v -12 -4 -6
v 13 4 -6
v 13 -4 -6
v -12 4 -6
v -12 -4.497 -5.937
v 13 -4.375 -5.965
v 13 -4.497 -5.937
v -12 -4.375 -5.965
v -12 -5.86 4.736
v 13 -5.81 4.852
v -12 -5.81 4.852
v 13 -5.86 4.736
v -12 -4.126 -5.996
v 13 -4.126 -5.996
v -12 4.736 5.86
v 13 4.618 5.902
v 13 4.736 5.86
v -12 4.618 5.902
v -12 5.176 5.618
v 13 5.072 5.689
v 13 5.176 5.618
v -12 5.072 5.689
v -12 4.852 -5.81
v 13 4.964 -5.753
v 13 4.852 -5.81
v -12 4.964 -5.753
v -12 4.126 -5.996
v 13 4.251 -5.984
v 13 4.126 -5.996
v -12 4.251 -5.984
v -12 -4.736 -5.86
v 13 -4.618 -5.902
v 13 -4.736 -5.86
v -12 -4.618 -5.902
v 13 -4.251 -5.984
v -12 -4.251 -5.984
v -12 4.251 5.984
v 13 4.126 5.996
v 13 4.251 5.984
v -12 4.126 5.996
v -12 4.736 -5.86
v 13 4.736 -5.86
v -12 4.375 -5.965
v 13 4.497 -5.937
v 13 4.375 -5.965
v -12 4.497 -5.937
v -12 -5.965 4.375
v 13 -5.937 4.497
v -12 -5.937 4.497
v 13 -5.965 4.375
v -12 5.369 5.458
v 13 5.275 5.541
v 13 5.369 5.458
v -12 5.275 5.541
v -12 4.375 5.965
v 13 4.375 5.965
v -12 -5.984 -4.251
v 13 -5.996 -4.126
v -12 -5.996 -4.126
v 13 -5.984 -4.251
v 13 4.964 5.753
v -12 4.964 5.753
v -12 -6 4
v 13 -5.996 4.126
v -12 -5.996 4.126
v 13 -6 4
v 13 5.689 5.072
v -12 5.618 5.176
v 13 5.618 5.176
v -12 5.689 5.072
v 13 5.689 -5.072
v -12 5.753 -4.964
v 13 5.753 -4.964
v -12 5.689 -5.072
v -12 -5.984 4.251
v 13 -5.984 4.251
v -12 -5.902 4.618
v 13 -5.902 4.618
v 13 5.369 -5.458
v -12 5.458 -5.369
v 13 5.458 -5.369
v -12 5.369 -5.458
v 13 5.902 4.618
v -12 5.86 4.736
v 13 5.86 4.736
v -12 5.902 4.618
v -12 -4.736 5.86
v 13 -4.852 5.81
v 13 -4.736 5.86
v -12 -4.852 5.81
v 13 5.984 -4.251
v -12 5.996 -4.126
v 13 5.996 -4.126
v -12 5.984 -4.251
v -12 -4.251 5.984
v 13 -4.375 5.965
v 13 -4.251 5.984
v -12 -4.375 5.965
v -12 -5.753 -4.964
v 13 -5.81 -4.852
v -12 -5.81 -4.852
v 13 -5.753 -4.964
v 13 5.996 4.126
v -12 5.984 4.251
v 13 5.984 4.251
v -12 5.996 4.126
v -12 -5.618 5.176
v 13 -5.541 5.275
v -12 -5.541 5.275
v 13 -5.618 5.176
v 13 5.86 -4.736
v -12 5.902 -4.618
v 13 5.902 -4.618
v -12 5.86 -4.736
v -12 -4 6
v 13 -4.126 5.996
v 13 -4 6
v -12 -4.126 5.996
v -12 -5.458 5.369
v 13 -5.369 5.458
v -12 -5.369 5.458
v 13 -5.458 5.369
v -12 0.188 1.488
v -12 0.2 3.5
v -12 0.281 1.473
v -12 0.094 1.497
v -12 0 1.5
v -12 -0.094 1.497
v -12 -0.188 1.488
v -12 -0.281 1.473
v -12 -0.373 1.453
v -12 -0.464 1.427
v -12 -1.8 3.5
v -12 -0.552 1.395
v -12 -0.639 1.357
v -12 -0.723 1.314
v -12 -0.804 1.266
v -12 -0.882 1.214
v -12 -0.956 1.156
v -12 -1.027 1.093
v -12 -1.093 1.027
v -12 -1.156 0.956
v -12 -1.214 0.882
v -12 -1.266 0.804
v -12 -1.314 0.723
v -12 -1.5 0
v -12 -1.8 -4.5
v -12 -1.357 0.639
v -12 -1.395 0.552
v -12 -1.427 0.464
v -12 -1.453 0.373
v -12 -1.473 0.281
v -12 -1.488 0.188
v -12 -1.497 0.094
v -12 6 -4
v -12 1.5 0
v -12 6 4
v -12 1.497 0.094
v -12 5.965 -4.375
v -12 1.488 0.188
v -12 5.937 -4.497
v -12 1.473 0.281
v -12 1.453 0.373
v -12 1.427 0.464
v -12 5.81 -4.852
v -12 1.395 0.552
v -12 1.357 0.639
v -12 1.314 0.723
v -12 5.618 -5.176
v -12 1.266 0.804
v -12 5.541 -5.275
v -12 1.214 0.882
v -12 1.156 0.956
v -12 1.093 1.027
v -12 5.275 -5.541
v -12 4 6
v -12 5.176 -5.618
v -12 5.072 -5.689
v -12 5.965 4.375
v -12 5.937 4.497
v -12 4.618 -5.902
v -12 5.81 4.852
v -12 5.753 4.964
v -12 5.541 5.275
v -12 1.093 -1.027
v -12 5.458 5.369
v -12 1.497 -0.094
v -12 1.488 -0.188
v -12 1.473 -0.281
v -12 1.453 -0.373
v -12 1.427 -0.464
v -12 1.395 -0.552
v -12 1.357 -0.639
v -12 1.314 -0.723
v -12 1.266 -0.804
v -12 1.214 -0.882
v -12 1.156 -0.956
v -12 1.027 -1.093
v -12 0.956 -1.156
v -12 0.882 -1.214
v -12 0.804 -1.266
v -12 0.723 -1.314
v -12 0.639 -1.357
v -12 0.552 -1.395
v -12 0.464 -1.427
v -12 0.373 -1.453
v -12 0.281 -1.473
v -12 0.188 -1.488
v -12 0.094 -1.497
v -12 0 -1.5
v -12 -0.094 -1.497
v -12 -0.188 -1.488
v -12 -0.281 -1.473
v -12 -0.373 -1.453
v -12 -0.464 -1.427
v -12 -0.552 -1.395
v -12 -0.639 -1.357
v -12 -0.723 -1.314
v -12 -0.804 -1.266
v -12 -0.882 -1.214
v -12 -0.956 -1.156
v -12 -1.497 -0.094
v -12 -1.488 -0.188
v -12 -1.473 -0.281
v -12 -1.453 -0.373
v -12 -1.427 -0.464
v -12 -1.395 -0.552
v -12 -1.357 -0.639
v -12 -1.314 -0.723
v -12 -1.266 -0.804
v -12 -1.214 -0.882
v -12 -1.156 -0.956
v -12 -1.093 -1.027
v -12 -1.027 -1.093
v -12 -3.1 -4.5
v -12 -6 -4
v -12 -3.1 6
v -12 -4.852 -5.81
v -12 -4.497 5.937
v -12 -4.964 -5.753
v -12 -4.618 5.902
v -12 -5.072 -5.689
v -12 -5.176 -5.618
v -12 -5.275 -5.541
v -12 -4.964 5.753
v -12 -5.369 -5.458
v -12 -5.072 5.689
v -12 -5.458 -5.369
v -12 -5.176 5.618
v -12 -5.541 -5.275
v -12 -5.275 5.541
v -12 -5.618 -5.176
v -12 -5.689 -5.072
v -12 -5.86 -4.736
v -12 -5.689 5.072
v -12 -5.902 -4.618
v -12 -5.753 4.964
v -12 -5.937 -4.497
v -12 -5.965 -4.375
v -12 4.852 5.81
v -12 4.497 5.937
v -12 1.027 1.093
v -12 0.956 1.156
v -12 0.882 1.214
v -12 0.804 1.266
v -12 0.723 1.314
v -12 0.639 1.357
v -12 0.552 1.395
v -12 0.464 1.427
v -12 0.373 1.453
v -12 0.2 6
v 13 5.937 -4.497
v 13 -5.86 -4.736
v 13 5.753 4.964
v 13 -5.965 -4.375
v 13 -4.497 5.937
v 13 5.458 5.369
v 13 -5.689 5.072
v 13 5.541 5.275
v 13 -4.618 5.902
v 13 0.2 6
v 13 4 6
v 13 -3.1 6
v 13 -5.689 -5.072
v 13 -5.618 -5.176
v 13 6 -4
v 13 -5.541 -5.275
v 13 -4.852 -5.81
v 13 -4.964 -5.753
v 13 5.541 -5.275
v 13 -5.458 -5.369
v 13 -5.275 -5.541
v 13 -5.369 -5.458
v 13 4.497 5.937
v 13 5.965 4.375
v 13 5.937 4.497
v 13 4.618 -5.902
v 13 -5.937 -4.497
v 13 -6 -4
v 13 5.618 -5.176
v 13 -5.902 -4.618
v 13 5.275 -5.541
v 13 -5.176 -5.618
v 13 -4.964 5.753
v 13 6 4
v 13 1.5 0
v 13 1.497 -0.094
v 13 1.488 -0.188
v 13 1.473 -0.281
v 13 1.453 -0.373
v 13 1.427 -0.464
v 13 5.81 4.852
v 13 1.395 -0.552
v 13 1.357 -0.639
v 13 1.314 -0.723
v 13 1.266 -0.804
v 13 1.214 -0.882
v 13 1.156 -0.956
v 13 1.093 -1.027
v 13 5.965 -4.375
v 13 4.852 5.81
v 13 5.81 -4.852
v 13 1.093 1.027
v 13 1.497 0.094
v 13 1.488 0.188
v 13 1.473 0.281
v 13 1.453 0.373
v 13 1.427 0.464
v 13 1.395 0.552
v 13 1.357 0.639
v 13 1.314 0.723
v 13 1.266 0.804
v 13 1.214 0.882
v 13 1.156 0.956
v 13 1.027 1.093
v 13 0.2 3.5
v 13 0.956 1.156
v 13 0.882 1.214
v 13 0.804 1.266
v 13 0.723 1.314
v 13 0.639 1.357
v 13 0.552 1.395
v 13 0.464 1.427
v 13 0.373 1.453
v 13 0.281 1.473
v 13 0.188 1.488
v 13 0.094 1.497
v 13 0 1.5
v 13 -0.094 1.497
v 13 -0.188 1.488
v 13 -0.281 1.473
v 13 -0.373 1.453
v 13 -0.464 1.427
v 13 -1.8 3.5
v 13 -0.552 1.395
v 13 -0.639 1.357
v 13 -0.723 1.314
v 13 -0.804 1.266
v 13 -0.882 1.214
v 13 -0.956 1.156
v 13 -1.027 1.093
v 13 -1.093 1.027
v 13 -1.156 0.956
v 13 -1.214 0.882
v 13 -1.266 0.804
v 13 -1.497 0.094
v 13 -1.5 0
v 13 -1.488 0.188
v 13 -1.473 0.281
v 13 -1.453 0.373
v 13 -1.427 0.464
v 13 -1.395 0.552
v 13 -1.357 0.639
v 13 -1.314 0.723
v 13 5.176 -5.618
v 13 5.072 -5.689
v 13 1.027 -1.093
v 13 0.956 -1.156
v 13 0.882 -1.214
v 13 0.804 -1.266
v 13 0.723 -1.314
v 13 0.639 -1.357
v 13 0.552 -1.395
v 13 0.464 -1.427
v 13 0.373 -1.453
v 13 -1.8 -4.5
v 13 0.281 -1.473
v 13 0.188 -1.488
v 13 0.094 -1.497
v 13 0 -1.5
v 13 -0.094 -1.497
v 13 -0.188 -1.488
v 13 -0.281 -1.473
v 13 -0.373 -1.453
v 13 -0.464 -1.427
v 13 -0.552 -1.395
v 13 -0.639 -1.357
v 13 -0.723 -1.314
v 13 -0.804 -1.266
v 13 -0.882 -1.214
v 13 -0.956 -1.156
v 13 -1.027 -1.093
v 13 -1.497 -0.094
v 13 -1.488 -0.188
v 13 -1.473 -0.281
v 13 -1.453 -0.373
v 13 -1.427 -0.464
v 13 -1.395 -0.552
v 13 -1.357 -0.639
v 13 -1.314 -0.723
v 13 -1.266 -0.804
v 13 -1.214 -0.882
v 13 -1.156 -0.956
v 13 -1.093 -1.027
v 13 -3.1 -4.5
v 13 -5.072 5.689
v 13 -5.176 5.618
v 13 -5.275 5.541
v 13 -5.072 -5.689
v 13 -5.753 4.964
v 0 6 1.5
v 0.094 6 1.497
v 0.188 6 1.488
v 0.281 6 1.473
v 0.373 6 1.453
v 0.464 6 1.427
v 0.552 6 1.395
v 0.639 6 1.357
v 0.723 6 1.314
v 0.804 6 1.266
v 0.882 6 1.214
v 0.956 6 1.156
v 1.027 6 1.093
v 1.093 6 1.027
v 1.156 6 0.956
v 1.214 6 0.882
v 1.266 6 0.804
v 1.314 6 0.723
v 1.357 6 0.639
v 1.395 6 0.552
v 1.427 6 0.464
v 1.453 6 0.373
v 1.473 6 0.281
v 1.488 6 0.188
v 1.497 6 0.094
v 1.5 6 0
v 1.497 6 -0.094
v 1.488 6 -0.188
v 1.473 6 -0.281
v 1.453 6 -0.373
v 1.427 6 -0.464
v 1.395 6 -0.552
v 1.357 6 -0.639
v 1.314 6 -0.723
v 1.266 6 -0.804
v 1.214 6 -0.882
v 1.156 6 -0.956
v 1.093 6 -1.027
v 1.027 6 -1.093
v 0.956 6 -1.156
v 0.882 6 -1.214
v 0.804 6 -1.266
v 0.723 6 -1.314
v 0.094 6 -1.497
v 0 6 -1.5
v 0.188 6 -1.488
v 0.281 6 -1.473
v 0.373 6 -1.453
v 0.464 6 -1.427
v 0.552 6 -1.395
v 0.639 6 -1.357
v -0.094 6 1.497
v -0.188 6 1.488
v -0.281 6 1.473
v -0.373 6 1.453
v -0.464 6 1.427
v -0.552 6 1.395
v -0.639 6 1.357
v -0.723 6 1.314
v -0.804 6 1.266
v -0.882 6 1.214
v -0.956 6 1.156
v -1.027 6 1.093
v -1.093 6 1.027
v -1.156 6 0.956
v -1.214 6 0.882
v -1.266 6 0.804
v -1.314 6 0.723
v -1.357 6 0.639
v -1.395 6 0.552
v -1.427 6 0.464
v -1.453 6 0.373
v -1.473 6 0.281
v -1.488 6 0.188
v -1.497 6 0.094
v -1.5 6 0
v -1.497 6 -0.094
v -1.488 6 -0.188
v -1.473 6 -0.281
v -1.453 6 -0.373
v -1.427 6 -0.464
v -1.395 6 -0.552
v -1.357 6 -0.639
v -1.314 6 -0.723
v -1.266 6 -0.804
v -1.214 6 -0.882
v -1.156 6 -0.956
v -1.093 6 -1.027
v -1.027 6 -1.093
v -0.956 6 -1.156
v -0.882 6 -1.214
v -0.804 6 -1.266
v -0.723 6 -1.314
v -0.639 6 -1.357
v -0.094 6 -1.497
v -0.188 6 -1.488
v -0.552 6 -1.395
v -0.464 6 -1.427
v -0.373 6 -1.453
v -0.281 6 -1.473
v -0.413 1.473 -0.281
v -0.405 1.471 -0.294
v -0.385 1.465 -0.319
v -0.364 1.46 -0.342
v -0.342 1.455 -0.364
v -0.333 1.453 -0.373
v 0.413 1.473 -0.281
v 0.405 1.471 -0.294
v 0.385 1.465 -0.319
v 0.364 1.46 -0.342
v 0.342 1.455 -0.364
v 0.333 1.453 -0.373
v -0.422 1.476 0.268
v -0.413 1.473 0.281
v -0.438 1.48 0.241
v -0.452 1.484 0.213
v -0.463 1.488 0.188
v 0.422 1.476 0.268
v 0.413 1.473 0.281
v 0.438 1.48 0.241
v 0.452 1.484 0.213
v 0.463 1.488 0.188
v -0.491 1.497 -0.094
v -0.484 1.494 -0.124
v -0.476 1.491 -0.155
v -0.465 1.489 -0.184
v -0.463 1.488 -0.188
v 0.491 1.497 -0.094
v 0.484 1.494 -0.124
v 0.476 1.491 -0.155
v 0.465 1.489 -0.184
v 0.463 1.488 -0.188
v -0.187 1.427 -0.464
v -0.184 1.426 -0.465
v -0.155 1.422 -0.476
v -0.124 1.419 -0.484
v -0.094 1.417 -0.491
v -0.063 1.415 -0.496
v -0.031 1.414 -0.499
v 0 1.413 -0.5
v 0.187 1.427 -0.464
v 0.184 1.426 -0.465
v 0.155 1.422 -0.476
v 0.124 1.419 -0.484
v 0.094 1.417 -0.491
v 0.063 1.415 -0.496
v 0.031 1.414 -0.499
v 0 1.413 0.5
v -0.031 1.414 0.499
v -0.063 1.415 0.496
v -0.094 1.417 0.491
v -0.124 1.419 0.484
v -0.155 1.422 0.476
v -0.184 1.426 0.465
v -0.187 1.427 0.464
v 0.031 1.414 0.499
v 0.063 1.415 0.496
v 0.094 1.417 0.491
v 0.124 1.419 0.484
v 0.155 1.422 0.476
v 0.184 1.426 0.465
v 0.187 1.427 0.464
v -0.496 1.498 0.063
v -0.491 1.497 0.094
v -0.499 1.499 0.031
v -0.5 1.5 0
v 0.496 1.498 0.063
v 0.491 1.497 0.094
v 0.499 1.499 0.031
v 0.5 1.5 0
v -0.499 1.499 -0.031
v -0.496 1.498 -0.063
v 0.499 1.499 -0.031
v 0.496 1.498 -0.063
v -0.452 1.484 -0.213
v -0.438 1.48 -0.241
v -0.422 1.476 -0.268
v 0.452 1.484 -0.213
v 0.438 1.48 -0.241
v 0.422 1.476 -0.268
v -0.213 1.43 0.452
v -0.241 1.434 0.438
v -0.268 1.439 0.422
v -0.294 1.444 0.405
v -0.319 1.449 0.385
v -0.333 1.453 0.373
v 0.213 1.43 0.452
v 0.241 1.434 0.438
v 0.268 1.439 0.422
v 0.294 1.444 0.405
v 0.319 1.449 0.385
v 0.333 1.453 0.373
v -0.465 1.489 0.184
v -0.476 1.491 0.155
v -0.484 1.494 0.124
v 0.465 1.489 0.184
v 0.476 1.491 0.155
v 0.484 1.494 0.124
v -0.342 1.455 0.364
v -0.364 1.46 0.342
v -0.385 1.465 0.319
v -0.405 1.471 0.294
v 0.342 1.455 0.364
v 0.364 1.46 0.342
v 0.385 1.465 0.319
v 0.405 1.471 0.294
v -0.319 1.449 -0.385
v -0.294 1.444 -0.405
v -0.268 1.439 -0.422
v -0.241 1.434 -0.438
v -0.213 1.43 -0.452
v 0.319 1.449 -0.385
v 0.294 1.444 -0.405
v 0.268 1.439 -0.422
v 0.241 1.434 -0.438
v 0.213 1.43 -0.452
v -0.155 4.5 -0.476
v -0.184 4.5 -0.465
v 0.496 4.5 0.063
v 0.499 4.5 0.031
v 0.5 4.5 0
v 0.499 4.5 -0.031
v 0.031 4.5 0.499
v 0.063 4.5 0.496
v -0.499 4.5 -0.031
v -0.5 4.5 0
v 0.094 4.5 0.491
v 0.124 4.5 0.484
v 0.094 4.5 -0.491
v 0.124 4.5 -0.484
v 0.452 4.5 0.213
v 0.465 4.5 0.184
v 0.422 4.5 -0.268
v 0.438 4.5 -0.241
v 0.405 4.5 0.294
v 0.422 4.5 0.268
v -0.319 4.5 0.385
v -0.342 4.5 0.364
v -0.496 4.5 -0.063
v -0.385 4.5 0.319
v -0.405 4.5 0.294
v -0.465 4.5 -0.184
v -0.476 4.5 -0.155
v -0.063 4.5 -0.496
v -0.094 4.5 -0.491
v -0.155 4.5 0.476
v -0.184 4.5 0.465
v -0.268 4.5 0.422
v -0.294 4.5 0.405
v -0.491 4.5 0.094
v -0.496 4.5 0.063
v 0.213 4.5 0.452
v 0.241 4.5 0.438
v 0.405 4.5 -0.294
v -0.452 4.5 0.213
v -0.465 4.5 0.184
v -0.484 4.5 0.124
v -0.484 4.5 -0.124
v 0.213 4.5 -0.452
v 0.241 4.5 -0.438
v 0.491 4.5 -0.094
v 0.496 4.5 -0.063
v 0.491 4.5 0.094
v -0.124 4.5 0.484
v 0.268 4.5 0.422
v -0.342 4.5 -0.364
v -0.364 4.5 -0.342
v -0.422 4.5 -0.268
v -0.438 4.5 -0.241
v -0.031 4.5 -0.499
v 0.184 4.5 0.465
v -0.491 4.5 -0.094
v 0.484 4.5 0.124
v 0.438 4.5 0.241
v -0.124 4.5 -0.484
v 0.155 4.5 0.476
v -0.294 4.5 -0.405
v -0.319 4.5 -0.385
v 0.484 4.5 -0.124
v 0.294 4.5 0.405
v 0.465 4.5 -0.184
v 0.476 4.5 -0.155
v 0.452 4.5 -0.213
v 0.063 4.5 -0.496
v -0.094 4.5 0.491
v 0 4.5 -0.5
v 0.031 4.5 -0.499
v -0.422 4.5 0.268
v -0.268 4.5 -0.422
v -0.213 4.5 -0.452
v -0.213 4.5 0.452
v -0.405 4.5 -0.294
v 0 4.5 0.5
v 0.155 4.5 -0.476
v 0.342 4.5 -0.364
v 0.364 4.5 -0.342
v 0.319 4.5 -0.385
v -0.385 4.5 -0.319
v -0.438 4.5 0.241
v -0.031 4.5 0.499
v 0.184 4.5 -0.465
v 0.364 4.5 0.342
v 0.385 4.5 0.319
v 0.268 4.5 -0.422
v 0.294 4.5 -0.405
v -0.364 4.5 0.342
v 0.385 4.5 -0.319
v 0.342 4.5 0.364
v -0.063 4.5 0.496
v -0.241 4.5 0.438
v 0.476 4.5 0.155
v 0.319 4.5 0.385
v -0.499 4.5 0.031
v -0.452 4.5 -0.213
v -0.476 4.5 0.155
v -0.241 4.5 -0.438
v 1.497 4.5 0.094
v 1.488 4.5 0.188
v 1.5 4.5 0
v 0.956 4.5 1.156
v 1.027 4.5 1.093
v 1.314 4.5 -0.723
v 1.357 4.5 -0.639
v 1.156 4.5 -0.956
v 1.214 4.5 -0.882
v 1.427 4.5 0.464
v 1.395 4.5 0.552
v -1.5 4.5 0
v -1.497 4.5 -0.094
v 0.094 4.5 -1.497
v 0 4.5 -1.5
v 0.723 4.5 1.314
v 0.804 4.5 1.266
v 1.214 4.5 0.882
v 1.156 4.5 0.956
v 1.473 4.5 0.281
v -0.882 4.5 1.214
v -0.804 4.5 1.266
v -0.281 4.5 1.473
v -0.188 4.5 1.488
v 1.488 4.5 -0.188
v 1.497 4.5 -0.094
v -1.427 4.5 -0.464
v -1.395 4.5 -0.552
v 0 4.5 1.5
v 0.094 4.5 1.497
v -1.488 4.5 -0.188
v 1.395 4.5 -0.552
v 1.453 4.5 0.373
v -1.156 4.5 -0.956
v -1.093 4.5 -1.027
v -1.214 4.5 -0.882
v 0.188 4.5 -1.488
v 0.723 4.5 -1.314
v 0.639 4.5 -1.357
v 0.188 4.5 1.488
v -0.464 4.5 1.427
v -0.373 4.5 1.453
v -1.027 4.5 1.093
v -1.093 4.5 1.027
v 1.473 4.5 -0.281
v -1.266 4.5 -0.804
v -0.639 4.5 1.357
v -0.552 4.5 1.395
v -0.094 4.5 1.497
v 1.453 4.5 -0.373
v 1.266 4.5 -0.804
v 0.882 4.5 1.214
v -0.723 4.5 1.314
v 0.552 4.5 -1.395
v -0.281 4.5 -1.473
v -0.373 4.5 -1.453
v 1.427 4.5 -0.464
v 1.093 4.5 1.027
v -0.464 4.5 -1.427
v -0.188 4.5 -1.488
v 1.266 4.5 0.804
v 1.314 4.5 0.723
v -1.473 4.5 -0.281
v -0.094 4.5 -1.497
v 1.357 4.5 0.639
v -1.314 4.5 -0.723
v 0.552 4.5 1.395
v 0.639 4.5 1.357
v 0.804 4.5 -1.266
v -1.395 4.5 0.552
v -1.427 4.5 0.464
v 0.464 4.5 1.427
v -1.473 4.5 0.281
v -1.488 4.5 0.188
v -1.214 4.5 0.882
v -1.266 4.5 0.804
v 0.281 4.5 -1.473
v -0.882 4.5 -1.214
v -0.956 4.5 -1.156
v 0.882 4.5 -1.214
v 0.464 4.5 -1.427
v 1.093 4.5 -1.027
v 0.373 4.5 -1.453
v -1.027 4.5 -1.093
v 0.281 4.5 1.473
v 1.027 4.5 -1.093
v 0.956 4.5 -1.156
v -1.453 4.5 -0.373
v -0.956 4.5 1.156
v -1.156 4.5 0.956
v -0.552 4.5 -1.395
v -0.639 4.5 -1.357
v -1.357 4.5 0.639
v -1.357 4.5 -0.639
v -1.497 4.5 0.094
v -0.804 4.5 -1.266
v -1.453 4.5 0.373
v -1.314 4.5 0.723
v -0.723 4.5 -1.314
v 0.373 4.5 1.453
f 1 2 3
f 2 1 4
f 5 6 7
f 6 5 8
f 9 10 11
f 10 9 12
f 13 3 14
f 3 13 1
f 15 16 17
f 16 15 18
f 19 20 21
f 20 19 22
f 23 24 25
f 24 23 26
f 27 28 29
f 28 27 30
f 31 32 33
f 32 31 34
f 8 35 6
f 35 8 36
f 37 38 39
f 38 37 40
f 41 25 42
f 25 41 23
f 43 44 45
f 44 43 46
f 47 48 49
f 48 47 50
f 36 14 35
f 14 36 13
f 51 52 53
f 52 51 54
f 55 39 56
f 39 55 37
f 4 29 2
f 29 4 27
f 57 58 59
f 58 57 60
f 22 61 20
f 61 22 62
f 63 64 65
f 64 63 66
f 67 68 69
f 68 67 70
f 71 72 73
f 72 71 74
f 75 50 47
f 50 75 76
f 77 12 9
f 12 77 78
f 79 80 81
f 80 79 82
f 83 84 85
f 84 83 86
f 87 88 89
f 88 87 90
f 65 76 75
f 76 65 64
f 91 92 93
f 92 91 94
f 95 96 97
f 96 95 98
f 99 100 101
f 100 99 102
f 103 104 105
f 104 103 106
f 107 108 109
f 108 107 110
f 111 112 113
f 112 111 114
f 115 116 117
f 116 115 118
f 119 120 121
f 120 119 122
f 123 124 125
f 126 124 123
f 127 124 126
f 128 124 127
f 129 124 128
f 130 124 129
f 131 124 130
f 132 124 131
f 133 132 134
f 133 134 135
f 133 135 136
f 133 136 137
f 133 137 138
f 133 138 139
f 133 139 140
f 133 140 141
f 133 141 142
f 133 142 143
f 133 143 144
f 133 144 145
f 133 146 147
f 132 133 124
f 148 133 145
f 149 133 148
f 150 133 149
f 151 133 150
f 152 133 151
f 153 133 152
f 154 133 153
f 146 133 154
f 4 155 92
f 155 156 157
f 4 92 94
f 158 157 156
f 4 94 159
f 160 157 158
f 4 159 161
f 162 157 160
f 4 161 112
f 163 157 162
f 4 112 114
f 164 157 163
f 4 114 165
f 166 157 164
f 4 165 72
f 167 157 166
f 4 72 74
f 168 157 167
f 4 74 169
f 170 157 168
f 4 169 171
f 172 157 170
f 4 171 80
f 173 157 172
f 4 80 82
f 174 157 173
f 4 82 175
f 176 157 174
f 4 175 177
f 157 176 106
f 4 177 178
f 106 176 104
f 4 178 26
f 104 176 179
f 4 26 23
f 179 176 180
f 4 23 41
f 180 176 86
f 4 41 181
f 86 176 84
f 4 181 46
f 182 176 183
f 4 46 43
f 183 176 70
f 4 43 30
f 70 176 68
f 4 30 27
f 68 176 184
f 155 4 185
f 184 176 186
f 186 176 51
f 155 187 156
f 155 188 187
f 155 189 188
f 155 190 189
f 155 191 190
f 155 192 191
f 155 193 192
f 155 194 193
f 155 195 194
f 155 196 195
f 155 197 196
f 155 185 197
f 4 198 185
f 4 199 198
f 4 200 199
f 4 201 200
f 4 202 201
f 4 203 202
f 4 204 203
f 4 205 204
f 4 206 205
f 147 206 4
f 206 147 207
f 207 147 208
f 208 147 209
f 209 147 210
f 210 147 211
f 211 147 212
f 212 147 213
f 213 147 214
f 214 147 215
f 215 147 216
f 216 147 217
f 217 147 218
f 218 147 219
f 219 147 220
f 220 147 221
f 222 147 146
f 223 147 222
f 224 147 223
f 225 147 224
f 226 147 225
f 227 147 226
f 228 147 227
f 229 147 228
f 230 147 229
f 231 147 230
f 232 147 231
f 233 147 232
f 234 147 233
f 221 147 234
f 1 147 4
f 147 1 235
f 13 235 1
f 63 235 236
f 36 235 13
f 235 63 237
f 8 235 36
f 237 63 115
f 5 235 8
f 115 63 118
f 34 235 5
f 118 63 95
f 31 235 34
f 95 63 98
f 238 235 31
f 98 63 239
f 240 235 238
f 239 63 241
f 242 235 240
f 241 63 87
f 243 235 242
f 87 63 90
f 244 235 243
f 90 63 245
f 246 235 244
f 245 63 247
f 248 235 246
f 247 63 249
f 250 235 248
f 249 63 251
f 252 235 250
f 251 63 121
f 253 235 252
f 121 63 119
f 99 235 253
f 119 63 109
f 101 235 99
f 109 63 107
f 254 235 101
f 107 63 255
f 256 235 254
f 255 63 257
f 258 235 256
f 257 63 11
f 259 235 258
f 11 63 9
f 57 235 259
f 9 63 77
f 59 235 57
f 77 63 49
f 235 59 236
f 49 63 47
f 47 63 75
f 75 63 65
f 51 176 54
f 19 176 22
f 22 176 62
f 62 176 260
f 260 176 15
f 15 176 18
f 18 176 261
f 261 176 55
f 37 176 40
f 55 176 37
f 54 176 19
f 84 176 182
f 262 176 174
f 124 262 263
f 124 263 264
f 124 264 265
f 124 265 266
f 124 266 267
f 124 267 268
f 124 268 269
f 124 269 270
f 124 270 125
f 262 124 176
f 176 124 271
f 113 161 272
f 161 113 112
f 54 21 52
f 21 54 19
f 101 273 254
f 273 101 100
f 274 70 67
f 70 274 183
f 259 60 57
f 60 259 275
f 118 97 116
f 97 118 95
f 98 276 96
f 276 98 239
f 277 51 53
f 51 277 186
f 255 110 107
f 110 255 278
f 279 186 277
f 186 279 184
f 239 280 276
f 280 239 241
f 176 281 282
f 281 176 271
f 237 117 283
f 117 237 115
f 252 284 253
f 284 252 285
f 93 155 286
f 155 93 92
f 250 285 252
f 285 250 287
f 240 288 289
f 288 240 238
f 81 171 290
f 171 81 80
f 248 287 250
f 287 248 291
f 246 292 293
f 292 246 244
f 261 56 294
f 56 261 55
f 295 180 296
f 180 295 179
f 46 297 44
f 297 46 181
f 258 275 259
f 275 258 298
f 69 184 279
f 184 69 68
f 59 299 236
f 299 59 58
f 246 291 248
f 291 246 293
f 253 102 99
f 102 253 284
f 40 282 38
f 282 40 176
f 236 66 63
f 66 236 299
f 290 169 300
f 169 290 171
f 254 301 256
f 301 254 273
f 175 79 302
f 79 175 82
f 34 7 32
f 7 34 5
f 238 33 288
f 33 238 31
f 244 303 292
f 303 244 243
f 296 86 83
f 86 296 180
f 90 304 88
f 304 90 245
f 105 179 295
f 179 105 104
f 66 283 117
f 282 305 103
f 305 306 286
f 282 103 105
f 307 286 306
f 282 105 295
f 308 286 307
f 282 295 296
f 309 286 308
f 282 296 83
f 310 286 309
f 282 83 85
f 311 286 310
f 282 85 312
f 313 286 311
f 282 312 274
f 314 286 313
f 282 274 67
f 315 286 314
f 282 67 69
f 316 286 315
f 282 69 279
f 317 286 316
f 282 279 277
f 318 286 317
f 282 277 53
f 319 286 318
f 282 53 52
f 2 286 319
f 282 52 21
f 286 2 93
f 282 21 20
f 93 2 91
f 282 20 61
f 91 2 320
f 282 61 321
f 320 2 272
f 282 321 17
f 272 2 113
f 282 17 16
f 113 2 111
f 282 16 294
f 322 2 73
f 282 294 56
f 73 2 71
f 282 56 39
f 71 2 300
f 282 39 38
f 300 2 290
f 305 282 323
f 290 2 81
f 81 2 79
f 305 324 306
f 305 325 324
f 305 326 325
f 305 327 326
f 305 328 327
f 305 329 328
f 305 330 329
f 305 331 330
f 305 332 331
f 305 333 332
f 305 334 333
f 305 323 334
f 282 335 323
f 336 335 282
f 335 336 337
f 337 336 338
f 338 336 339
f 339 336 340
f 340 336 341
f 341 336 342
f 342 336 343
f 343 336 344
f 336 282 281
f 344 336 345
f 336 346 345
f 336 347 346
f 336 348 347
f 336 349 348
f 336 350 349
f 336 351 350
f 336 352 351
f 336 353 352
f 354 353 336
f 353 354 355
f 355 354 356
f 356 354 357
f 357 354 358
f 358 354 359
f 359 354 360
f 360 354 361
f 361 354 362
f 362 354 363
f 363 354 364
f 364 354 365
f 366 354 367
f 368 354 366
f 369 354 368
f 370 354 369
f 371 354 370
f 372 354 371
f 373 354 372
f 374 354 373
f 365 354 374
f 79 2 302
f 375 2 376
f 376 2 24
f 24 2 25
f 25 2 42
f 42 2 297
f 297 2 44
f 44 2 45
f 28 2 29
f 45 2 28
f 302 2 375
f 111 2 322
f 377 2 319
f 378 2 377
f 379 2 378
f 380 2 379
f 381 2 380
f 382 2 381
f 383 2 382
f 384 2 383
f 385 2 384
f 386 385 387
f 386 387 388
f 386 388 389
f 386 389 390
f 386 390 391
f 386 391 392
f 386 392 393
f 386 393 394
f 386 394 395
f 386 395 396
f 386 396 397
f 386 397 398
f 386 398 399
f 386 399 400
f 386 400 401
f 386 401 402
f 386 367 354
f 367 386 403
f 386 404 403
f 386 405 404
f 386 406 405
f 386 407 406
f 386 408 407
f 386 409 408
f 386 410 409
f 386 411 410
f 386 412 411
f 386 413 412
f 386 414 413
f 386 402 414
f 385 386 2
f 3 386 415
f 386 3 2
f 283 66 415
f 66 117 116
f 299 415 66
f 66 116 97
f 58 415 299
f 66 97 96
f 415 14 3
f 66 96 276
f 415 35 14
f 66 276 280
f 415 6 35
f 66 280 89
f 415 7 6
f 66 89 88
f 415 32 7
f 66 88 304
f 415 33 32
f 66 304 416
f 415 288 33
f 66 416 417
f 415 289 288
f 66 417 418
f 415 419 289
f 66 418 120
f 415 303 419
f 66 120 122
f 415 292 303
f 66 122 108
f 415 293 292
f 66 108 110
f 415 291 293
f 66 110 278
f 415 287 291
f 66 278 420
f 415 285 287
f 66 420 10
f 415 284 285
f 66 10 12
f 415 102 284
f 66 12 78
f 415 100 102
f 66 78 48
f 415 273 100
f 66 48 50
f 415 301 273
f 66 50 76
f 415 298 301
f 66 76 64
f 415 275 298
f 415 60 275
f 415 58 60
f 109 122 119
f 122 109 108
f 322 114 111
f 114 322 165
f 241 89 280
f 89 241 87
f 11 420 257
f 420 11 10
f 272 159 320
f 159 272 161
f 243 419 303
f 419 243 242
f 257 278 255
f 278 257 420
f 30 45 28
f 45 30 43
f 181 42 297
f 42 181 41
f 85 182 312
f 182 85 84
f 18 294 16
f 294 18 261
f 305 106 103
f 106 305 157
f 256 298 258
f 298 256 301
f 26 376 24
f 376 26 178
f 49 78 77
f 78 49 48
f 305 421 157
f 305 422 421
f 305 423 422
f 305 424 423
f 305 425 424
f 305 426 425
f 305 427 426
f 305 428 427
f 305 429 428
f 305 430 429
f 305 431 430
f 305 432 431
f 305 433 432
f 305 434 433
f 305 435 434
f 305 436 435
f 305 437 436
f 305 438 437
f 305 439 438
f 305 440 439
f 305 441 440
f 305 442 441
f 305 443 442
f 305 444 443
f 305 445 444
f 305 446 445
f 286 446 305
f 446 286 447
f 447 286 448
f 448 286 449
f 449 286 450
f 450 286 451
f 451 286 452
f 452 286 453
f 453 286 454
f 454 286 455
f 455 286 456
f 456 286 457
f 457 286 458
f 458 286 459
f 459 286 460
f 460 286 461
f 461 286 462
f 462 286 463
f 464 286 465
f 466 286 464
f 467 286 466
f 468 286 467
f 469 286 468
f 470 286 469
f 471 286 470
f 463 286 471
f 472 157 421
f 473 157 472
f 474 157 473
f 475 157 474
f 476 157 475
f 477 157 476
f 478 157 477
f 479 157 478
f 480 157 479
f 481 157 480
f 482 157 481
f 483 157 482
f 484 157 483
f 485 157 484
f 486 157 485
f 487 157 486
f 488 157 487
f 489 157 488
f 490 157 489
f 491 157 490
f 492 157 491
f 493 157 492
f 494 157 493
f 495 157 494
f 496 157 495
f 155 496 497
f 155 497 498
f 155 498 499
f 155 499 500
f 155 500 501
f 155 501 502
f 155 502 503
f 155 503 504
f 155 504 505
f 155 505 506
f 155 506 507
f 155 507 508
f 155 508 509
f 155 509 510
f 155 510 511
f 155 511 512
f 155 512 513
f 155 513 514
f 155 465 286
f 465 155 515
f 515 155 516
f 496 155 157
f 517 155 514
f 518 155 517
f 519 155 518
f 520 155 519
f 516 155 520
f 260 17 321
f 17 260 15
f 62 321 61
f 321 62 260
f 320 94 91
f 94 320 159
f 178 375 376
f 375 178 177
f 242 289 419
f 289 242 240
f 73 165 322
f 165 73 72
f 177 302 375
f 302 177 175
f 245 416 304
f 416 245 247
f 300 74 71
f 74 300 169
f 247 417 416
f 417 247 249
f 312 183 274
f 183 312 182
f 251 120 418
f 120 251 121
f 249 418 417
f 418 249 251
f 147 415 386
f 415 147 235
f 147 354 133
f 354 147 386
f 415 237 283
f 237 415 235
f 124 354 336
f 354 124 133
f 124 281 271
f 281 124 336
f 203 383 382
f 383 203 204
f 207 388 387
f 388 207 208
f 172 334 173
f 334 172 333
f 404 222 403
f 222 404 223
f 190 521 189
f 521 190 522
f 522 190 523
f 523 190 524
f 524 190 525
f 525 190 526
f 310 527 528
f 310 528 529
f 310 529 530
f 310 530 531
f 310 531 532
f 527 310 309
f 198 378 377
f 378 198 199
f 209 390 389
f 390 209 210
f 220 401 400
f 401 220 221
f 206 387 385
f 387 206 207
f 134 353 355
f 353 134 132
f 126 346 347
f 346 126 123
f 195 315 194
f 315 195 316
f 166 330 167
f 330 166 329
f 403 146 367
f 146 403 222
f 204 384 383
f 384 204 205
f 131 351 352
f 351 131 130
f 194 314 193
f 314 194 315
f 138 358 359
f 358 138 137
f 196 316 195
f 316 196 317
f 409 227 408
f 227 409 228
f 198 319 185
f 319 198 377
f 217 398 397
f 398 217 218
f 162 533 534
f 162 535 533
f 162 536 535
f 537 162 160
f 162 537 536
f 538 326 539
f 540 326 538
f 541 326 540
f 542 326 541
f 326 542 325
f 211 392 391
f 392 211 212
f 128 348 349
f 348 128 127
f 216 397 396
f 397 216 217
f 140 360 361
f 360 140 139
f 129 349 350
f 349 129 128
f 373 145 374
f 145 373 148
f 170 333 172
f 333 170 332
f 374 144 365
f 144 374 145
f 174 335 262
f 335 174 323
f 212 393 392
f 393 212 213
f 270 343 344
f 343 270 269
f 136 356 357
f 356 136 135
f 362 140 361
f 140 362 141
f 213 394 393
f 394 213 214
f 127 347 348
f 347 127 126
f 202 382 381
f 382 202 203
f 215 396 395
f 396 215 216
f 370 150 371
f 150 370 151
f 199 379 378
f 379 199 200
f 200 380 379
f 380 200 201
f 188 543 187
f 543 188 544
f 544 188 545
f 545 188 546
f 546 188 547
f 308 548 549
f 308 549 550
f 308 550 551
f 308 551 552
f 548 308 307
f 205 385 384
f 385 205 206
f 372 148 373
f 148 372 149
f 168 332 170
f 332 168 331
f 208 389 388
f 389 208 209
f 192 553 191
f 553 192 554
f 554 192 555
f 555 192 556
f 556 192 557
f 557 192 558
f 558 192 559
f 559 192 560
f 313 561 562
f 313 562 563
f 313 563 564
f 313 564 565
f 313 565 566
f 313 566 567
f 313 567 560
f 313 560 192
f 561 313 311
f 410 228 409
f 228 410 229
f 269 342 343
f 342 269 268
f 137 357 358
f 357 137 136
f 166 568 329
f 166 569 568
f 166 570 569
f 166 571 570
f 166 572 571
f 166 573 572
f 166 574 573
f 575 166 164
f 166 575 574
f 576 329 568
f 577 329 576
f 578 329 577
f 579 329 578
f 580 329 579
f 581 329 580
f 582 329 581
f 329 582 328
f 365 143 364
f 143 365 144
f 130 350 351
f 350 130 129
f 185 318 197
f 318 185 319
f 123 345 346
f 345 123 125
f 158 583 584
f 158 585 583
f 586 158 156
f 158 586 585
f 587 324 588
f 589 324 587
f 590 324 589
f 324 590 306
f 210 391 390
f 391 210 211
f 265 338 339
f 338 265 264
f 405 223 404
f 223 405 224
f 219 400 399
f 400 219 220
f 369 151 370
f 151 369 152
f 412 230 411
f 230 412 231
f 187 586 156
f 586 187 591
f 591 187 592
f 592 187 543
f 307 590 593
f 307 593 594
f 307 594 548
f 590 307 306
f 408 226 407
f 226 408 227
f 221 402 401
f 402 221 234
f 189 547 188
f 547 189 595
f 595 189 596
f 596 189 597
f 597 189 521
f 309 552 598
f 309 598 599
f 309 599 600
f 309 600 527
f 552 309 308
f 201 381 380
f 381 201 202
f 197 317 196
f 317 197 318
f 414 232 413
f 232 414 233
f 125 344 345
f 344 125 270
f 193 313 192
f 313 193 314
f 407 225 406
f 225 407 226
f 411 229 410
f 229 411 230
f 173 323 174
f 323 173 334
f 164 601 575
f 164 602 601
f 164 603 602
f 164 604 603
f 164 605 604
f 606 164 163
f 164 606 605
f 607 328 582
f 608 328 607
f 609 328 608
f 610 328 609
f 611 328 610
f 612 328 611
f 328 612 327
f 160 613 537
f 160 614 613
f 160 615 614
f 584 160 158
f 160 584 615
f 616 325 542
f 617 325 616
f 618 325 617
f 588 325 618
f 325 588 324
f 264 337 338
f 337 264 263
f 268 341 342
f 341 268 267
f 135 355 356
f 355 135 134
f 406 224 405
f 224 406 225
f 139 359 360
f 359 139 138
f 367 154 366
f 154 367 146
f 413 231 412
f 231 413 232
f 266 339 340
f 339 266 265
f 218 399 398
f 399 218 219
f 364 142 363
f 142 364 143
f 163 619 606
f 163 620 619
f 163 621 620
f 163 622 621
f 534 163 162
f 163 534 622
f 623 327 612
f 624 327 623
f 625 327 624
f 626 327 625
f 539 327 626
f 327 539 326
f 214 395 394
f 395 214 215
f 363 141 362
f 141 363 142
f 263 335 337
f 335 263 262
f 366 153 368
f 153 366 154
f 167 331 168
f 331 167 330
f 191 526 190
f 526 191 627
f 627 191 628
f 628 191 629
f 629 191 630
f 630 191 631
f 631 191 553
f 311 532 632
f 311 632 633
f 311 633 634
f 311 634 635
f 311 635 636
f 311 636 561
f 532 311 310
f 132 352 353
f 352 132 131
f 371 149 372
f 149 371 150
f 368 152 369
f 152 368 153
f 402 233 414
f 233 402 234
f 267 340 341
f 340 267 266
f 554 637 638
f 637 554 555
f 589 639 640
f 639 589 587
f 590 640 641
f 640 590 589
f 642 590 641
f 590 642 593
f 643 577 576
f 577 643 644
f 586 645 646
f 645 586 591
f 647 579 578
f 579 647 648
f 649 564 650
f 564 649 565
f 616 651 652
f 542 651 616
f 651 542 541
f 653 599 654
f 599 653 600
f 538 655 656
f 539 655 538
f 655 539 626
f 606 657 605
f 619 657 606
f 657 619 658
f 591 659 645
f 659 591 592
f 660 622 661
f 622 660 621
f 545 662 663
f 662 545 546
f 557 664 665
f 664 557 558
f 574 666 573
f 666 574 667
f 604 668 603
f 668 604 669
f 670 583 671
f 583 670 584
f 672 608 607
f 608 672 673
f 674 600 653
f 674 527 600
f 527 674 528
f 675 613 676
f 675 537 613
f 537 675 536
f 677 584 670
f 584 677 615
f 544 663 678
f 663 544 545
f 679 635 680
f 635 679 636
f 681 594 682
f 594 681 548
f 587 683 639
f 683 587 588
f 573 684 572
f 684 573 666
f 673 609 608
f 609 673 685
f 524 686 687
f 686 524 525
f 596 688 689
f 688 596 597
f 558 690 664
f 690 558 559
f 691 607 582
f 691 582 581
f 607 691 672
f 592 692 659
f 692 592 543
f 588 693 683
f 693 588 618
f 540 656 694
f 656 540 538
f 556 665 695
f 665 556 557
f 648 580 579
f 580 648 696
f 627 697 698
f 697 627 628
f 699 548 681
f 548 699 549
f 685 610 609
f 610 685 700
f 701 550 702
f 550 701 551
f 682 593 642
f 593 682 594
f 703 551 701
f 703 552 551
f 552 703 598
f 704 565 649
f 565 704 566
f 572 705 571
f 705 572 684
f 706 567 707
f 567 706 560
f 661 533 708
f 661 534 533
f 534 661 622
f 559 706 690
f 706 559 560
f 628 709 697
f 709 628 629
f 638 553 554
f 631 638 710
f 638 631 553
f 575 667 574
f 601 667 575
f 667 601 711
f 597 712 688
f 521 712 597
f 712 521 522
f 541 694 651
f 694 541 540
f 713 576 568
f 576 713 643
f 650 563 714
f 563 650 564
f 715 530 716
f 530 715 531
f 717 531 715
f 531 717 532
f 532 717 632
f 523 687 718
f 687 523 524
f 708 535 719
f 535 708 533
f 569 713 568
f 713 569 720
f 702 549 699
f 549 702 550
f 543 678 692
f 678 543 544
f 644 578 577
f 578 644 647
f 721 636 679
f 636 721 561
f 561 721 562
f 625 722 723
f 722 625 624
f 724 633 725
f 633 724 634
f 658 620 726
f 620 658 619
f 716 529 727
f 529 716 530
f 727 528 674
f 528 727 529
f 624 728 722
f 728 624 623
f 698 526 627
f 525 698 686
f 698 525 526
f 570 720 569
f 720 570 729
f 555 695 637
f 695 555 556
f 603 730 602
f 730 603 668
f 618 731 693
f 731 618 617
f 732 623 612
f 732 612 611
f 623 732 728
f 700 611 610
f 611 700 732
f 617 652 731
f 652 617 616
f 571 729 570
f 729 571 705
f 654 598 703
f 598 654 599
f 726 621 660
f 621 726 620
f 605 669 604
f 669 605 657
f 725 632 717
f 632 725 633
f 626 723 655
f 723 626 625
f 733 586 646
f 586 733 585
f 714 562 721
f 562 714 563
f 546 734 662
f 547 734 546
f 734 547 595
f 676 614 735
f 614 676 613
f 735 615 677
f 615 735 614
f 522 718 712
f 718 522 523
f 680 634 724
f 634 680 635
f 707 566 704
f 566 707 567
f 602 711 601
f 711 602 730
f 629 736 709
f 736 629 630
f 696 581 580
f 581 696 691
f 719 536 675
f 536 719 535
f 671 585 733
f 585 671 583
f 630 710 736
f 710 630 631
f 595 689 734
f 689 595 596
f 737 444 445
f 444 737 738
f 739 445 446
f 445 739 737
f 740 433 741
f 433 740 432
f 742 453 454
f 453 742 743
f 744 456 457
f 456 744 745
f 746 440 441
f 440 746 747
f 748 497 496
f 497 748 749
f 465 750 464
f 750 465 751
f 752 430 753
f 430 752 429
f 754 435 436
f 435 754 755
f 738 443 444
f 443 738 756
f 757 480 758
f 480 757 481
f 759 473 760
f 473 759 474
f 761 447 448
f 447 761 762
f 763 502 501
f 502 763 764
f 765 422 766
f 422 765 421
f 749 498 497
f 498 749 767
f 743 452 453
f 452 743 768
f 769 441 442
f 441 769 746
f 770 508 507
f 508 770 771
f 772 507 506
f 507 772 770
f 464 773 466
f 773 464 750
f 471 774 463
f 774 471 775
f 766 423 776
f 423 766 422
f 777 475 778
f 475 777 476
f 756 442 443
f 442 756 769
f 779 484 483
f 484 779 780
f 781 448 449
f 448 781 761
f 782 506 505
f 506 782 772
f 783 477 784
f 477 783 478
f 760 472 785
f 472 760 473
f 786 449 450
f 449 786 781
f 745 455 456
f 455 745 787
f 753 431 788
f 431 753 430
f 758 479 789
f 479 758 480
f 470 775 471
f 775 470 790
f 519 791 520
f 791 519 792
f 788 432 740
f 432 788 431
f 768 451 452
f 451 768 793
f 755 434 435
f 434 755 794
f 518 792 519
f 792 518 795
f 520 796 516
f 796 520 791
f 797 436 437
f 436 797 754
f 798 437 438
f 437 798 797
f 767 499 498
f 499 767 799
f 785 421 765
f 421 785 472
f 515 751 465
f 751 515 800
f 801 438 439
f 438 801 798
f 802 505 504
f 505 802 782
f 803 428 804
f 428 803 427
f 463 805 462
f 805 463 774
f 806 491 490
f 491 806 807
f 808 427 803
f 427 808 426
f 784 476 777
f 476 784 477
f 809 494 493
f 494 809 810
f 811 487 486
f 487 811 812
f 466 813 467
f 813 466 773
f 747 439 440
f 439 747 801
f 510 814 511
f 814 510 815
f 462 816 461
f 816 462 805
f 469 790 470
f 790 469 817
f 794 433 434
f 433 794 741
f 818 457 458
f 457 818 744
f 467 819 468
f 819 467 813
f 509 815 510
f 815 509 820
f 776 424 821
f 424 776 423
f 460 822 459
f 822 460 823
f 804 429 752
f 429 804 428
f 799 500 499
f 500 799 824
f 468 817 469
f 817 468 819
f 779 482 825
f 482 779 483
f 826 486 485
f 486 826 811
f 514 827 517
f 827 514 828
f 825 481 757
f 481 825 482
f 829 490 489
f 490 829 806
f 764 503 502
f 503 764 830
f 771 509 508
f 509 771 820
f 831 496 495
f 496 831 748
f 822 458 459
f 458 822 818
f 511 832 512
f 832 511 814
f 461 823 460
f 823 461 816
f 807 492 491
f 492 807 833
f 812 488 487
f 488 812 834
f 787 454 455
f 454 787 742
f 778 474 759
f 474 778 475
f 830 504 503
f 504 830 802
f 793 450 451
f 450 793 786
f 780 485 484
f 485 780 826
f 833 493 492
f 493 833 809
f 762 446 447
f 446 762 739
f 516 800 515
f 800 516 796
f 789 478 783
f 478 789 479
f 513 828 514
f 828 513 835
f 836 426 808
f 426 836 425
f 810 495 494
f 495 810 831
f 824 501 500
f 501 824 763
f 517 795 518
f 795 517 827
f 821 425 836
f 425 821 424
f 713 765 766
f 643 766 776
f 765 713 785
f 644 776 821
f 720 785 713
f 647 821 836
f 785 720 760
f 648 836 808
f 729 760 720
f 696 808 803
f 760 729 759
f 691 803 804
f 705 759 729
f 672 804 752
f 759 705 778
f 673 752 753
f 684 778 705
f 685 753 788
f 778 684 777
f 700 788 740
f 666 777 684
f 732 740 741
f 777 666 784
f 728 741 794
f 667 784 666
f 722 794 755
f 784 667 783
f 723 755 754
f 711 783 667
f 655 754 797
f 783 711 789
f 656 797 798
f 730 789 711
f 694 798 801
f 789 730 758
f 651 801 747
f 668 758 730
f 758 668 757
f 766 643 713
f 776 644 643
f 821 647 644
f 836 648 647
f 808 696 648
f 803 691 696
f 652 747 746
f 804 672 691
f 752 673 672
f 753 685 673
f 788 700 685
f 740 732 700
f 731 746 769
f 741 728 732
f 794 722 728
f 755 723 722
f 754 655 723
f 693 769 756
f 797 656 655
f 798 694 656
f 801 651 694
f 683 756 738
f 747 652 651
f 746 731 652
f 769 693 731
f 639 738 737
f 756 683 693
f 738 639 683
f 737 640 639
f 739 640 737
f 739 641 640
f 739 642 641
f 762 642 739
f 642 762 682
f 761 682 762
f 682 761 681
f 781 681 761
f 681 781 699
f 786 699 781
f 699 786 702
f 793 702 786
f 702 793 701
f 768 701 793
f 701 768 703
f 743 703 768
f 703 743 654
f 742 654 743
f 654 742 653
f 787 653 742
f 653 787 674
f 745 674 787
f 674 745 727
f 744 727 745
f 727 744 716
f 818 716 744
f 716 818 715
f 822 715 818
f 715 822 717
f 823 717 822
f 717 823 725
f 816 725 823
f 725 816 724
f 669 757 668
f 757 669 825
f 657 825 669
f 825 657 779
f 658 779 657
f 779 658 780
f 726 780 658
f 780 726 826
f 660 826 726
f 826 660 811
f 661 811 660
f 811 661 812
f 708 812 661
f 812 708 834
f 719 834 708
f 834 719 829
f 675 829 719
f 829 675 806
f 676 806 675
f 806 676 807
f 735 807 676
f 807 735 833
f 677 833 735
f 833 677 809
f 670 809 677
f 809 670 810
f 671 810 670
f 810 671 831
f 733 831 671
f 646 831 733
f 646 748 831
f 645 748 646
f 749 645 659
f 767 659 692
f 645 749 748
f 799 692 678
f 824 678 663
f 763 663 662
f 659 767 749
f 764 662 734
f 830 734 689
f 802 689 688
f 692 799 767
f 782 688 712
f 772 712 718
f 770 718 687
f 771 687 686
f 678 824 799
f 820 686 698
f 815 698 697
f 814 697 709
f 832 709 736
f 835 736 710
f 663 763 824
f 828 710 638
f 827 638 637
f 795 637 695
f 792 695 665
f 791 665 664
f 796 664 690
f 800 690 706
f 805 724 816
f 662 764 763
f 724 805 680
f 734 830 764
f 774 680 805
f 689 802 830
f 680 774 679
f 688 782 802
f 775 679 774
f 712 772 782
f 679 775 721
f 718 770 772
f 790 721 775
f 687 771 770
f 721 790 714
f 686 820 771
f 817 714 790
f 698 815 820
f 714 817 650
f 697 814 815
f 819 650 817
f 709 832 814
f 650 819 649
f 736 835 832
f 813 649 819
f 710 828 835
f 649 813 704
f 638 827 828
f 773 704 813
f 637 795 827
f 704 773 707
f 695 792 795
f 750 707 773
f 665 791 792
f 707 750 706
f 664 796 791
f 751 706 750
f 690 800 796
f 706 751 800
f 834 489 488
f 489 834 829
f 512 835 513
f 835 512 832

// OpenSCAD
// the nut that slides along the stepper motor's screw
module motor_slider() {
	height = 24;
	
	difference() {
		// slider body
		minkowski() {
			cube([height, 8, 8], center = true);
			rotate([0, 90, 0]) {
				cylinder(r = 2, h = 1, $fn = 100);
			}
		}
		
		// motor frame holes
		translate([0.5, -2.45, 0.25]) {
			cube(size = [height + 2, 1.3, 9.5], center = true);
		}
		translate([0.5, -1.45, 4.9]) {
			cube(size = [height + 2, 3.3, 2.8], center = true);
		}
			
		// motor drive hole
		translate([0.5, 0, 0]) {
			rotate([0, 90, 0]) {
				cylinder(h = height + 2, r = 1.5, center = true, $fn = 100);
			}
		}
		
		// motor screw hole
		translate([0, 10, 0]) {
			rotate([90, 0, 0]) {
				cylinder(h = 9, r = 0.5, $fn = 100);
			}
		}
		translate([0, 13.5, 0]) {
			rotate([90, 0, 0]) {
				cylinder(h = 9, r = 1.5, $fn = 100);
			}
		}
	}
}

motor_slider();
